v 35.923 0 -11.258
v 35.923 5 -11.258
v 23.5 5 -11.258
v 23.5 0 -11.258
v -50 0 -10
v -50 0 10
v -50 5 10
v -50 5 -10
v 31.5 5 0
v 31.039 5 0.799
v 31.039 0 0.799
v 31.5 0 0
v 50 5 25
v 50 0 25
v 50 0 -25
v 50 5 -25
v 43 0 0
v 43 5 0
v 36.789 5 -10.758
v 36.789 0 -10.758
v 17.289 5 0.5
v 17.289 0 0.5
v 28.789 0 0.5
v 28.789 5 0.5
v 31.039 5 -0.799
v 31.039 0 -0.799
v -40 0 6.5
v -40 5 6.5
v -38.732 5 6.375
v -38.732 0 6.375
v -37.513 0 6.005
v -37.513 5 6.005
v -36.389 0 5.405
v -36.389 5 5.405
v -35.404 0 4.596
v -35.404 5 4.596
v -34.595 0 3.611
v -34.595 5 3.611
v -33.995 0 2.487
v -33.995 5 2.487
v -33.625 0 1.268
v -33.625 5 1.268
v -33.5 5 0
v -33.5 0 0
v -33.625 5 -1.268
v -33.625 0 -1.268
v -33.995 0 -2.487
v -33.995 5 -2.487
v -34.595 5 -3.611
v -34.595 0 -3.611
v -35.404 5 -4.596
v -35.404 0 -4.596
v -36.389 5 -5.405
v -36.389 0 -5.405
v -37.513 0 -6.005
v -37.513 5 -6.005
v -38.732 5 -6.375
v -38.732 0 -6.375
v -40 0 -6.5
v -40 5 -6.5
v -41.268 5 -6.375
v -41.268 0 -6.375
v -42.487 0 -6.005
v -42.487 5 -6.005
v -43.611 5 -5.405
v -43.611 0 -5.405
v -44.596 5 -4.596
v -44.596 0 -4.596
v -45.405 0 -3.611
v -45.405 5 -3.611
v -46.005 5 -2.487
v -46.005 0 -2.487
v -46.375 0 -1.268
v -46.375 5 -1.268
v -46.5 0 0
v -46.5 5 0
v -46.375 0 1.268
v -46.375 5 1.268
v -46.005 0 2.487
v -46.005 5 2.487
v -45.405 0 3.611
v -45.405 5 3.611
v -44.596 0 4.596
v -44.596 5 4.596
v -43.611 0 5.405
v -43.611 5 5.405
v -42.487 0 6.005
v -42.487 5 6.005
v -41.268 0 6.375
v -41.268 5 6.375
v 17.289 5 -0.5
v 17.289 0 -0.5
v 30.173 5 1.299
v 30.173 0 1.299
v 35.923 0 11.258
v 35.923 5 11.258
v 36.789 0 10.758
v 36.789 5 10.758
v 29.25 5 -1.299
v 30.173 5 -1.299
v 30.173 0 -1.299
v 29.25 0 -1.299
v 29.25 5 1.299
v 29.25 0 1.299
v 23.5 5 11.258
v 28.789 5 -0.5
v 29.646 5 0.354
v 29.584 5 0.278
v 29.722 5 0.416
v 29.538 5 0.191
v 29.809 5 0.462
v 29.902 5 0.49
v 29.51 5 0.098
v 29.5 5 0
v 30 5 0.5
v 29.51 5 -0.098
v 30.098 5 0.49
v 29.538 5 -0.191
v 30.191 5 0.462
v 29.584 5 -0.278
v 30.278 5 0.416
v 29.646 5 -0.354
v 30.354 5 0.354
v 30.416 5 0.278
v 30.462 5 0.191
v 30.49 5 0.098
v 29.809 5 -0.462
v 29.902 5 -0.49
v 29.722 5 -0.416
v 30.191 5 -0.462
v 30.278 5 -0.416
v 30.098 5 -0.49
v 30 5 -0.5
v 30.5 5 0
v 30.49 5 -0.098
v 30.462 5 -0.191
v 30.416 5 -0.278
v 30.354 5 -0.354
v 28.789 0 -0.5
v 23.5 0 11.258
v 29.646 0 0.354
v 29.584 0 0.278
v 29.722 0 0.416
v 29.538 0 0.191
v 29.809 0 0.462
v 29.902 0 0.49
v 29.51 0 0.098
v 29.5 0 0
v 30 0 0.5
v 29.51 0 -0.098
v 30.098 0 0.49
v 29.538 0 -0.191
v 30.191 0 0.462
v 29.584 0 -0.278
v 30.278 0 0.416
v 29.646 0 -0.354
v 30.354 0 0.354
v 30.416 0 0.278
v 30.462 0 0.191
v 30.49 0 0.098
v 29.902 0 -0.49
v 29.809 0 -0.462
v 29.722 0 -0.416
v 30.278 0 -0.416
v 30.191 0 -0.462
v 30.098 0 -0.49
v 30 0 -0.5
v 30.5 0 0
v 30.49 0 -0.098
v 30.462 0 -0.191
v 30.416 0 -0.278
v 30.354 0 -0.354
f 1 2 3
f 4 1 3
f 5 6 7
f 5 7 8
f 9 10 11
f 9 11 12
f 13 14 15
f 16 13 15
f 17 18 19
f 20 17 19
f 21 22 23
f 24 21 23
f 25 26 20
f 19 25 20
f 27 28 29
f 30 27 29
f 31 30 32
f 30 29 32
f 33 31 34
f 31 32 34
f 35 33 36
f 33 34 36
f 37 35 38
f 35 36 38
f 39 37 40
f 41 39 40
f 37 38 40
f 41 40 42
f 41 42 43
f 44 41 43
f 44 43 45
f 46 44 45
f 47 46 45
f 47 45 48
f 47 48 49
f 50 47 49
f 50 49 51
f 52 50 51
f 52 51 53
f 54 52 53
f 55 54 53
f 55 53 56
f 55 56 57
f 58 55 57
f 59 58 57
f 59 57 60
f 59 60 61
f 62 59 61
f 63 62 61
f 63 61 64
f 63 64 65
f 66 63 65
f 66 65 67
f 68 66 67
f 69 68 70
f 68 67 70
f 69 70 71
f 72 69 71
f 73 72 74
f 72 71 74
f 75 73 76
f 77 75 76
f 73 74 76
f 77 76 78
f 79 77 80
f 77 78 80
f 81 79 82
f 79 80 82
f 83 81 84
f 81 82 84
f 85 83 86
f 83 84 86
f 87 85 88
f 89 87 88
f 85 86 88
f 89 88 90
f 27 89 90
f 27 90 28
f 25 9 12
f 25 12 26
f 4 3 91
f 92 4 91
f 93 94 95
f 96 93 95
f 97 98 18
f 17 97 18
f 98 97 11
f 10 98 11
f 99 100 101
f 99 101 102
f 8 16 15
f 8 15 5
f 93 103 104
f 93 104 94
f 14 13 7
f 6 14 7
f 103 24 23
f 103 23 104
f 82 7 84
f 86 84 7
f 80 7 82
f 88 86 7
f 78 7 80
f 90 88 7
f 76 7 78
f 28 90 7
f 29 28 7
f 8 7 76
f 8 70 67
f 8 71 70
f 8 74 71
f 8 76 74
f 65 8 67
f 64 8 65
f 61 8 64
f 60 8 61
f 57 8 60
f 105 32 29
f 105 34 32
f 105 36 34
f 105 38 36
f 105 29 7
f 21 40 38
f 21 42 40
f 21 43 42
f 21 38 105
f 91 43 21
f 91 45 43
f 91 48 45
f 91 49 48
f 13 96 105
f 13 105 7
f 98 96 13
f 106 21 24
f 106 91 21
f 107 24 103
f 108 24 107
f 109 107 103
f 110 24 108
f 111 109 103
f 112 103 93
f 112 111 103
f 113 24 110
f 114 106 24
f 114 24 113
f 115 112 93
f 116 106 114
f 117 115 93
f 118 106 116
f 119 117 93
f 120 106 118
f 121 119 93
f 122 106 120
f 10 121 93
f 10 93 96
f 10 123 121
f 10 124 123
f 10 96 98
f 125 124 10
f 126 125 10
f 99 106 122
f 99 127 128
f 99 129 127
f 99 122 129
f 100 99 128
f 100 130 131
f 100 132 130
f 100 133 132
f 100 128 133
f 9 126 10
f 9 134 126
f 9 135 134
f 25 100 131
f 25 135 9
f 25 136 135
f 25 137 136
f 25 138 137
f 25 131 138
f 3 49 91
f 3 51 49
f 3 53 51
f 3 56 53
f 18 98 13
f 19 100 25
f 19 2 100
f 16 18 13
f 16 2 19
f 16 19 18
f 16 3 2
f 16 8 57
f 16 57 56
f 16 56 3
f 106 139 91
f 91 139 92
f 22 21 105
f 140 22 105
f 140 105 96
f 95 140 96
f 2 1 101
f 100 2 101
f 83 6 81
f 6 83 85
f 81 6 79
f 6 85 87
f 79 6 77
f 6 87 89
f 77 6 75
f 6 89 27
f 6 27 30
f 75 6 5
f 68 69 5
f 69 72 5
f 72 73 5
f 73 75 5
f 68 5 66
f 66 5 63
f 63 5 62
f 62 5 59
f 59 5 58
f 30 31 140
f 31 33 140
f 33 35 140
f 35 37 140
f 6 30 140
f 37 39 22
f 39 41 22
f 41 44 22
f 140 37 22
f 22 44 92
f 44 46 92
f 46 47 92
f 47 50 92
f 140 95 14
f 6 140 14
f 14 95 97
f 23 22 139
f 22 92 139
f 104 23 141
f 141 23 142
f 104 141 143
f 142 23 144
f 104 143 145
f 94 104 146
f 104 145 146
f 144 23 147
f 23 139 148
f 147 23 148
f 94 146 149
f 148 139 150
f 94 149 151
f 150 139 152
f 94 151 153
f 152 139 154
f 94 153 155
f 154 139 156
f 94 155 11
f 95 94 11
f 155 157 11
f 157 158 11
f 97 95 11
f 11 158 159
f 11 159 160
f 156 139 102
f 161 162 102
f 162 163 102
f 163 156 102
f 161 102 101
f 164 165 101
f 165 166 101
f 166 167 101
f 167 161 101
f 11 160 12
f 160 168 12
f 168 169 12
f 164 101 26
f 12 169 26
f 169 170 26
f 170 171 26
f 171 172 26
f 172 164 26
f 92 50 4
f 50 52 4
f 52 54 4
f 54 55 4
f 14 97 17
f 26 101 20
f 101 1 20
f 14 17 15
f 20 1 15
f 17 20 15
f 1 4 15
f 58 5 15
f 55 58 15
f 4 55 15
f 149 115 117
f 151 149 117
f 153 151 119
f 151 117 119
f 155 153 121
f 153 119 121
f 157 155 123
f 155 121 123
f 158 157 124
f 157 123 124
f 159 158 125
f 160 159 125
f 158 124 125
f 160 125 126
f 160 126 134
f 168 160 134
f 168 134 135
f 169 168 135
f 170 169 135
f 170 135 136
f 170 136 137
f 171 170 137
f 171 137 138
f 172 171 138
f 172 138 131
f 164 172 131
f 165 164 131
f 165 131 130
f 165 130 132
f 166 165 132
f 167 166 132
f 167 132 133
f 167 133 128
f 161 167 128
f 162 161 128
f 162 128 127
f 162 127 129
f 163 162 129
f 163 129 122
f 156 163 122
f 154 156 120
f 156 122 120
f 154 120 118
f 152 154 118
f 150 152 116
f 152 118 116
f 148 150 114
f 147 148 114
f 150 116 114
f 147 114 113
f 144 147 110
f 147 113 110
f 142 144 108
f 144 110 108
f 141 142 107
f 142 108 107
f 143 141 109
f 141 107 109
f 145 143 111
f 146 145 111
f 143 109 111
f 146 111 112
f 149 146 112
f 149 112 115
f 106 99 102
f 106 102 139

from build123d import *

# Parameters (mm, degrees)
SKETCH1_W           = 100
SKETCH1_H           = 50
BOSS_EXTRUDE1_DEPTH = 5
CUT_EXTRUDE1_DEPTH  = 10
CUT_EXTRUDE2_DEPTH  = 57.124860802
EXTRUDE_THIN2_START = -5
EXTRUDE_THIN2_DEPTH = 5
BOSS_EXTRUDE3_DEPTH = 5
SKETCH7_R           = 6.5
CUT_EXTRUDE3_DEPTH  = 57.124860802
SKETCH8_R           = 0.5
CUT_EXTRUDE4_DEPTH  = 57.124860802


# Read off the part's stored shape, not the designer's step: Extrude-Thin2
with BuildPart() as part:
    # Sketch1 → Boss-Extrude1 (new body)
    with BuildSketch(Plane(origin=(0, 0, 0), x_dir=(1, 0, 0), z_dir=(0, 1, 0))):
        Rectangle(SKETCH1_W, SKETCH1_H)
    extrude(amount=BOSS_EXTRUDE1_DEPTH)

    # Sketch2 → Cut-Extrude1 (cut)
    with BuildSketch(Plane(origin=(0, 5, 0), x_dir=(1, 0, 0), z_dir=(0, 1, 0))):
        Polygon((23.5, -11.258330249), (36.5, -11.258330249), (43, 0), (36.5, 11.258330249), (23.5, 11.258330249), (17, 0), align=None)
    extrude(amount=-CUT_EXTRUDE1_DEPTH, mode=Mode.SUBTRACT)

    # Sketch3 → Cut-Extrude2 (cut, through all)
    with BuildSketch(Plane(origin=(0, 5, 0), x_dir=(1, 0, 0), z_dir=(0, 1, 0))):
        Polygon((50, -25), (-50, -10), (-50, -25), align=None)
    cut_extrude2 = extrude(amount=-CUT_EXTRUDE2_DEPTH, mode=Mode.SUBTRACT)

    # Mirror1: Cut-Extrude2 across plane
    add(cut_extrude2.mirror(Plane.XY), mode=Mode.SUBTRACT)

    # Extrude-Thin2 outline → Extrude-Thin2 (add)
    with BuildSketch(Plane(origin=(0, 5, 0), x_dir=(1, 0, 0), z_dir=(0, 1, 0)).offset(EXTRUDE_THIN2_START)):
        Polygon((17, 0), (17.288675135, -0.5), (29.711324865, -0.5), (35.922649731, -11.258330249), (36.5, -11.258330249), (36.788675135, -10.758330249), (30.577350269, 0), (36.788675135, 10.758330249), (36.5, 11.258330249), (35.922649731, 11.258330249), (29.711324865, 0.5), (17.288675135, 0.5), align=None)
    extrude(amount=EXTRUDE_THIN2_DEPTH)

    # Sketch6 → Boss-Extrude3 (add, through all)
    with BuildSketch(Plane(origin=(0, 5, 0), x_dir=(1, 0, 0), z_dir=(0, 1, 0))):
        Polygon((31.5, 0), (30.75, 1.299038106), (29.25, 1.299038106), (28.5, 0), (29.25, -1.299038106), (30.75, -1.299038106), align=None)
    extrude(amount=-BOSS_EXTRUDE3_DEPTH)

    # Sketch7 → Cut-Extrude3 (cut, through all)
    with BuildSketch(Plane(origin=(0, 5, 0), x_dir=(1, 0, 0), z_dir=(0, 1, 0))):
        with Locations(Location((-40, 0, 0), (0, 0, 270))):
            Circle(SKETCH7_R)
    extrude(amount=-CUT_EXTRUDE3_DEPTH, mode=Mode.SUBTRACT)

    # Sketch8 → Cut-Extrude4 (cut, through all)
    with BuildSketch(Plane(origin=(0, 5, 0), x_dir=(1, 0, 0), z_dir=(0, 1, 0))):
        with Locations(Location((30, 0, 0), (0, 0, 270))):
            Circle(SKETCH8_R)
    extrude(amount=-CUT_EXTRUDE4_DEPTH, mode=Mode.SUBTRACT)


solid = part.part
